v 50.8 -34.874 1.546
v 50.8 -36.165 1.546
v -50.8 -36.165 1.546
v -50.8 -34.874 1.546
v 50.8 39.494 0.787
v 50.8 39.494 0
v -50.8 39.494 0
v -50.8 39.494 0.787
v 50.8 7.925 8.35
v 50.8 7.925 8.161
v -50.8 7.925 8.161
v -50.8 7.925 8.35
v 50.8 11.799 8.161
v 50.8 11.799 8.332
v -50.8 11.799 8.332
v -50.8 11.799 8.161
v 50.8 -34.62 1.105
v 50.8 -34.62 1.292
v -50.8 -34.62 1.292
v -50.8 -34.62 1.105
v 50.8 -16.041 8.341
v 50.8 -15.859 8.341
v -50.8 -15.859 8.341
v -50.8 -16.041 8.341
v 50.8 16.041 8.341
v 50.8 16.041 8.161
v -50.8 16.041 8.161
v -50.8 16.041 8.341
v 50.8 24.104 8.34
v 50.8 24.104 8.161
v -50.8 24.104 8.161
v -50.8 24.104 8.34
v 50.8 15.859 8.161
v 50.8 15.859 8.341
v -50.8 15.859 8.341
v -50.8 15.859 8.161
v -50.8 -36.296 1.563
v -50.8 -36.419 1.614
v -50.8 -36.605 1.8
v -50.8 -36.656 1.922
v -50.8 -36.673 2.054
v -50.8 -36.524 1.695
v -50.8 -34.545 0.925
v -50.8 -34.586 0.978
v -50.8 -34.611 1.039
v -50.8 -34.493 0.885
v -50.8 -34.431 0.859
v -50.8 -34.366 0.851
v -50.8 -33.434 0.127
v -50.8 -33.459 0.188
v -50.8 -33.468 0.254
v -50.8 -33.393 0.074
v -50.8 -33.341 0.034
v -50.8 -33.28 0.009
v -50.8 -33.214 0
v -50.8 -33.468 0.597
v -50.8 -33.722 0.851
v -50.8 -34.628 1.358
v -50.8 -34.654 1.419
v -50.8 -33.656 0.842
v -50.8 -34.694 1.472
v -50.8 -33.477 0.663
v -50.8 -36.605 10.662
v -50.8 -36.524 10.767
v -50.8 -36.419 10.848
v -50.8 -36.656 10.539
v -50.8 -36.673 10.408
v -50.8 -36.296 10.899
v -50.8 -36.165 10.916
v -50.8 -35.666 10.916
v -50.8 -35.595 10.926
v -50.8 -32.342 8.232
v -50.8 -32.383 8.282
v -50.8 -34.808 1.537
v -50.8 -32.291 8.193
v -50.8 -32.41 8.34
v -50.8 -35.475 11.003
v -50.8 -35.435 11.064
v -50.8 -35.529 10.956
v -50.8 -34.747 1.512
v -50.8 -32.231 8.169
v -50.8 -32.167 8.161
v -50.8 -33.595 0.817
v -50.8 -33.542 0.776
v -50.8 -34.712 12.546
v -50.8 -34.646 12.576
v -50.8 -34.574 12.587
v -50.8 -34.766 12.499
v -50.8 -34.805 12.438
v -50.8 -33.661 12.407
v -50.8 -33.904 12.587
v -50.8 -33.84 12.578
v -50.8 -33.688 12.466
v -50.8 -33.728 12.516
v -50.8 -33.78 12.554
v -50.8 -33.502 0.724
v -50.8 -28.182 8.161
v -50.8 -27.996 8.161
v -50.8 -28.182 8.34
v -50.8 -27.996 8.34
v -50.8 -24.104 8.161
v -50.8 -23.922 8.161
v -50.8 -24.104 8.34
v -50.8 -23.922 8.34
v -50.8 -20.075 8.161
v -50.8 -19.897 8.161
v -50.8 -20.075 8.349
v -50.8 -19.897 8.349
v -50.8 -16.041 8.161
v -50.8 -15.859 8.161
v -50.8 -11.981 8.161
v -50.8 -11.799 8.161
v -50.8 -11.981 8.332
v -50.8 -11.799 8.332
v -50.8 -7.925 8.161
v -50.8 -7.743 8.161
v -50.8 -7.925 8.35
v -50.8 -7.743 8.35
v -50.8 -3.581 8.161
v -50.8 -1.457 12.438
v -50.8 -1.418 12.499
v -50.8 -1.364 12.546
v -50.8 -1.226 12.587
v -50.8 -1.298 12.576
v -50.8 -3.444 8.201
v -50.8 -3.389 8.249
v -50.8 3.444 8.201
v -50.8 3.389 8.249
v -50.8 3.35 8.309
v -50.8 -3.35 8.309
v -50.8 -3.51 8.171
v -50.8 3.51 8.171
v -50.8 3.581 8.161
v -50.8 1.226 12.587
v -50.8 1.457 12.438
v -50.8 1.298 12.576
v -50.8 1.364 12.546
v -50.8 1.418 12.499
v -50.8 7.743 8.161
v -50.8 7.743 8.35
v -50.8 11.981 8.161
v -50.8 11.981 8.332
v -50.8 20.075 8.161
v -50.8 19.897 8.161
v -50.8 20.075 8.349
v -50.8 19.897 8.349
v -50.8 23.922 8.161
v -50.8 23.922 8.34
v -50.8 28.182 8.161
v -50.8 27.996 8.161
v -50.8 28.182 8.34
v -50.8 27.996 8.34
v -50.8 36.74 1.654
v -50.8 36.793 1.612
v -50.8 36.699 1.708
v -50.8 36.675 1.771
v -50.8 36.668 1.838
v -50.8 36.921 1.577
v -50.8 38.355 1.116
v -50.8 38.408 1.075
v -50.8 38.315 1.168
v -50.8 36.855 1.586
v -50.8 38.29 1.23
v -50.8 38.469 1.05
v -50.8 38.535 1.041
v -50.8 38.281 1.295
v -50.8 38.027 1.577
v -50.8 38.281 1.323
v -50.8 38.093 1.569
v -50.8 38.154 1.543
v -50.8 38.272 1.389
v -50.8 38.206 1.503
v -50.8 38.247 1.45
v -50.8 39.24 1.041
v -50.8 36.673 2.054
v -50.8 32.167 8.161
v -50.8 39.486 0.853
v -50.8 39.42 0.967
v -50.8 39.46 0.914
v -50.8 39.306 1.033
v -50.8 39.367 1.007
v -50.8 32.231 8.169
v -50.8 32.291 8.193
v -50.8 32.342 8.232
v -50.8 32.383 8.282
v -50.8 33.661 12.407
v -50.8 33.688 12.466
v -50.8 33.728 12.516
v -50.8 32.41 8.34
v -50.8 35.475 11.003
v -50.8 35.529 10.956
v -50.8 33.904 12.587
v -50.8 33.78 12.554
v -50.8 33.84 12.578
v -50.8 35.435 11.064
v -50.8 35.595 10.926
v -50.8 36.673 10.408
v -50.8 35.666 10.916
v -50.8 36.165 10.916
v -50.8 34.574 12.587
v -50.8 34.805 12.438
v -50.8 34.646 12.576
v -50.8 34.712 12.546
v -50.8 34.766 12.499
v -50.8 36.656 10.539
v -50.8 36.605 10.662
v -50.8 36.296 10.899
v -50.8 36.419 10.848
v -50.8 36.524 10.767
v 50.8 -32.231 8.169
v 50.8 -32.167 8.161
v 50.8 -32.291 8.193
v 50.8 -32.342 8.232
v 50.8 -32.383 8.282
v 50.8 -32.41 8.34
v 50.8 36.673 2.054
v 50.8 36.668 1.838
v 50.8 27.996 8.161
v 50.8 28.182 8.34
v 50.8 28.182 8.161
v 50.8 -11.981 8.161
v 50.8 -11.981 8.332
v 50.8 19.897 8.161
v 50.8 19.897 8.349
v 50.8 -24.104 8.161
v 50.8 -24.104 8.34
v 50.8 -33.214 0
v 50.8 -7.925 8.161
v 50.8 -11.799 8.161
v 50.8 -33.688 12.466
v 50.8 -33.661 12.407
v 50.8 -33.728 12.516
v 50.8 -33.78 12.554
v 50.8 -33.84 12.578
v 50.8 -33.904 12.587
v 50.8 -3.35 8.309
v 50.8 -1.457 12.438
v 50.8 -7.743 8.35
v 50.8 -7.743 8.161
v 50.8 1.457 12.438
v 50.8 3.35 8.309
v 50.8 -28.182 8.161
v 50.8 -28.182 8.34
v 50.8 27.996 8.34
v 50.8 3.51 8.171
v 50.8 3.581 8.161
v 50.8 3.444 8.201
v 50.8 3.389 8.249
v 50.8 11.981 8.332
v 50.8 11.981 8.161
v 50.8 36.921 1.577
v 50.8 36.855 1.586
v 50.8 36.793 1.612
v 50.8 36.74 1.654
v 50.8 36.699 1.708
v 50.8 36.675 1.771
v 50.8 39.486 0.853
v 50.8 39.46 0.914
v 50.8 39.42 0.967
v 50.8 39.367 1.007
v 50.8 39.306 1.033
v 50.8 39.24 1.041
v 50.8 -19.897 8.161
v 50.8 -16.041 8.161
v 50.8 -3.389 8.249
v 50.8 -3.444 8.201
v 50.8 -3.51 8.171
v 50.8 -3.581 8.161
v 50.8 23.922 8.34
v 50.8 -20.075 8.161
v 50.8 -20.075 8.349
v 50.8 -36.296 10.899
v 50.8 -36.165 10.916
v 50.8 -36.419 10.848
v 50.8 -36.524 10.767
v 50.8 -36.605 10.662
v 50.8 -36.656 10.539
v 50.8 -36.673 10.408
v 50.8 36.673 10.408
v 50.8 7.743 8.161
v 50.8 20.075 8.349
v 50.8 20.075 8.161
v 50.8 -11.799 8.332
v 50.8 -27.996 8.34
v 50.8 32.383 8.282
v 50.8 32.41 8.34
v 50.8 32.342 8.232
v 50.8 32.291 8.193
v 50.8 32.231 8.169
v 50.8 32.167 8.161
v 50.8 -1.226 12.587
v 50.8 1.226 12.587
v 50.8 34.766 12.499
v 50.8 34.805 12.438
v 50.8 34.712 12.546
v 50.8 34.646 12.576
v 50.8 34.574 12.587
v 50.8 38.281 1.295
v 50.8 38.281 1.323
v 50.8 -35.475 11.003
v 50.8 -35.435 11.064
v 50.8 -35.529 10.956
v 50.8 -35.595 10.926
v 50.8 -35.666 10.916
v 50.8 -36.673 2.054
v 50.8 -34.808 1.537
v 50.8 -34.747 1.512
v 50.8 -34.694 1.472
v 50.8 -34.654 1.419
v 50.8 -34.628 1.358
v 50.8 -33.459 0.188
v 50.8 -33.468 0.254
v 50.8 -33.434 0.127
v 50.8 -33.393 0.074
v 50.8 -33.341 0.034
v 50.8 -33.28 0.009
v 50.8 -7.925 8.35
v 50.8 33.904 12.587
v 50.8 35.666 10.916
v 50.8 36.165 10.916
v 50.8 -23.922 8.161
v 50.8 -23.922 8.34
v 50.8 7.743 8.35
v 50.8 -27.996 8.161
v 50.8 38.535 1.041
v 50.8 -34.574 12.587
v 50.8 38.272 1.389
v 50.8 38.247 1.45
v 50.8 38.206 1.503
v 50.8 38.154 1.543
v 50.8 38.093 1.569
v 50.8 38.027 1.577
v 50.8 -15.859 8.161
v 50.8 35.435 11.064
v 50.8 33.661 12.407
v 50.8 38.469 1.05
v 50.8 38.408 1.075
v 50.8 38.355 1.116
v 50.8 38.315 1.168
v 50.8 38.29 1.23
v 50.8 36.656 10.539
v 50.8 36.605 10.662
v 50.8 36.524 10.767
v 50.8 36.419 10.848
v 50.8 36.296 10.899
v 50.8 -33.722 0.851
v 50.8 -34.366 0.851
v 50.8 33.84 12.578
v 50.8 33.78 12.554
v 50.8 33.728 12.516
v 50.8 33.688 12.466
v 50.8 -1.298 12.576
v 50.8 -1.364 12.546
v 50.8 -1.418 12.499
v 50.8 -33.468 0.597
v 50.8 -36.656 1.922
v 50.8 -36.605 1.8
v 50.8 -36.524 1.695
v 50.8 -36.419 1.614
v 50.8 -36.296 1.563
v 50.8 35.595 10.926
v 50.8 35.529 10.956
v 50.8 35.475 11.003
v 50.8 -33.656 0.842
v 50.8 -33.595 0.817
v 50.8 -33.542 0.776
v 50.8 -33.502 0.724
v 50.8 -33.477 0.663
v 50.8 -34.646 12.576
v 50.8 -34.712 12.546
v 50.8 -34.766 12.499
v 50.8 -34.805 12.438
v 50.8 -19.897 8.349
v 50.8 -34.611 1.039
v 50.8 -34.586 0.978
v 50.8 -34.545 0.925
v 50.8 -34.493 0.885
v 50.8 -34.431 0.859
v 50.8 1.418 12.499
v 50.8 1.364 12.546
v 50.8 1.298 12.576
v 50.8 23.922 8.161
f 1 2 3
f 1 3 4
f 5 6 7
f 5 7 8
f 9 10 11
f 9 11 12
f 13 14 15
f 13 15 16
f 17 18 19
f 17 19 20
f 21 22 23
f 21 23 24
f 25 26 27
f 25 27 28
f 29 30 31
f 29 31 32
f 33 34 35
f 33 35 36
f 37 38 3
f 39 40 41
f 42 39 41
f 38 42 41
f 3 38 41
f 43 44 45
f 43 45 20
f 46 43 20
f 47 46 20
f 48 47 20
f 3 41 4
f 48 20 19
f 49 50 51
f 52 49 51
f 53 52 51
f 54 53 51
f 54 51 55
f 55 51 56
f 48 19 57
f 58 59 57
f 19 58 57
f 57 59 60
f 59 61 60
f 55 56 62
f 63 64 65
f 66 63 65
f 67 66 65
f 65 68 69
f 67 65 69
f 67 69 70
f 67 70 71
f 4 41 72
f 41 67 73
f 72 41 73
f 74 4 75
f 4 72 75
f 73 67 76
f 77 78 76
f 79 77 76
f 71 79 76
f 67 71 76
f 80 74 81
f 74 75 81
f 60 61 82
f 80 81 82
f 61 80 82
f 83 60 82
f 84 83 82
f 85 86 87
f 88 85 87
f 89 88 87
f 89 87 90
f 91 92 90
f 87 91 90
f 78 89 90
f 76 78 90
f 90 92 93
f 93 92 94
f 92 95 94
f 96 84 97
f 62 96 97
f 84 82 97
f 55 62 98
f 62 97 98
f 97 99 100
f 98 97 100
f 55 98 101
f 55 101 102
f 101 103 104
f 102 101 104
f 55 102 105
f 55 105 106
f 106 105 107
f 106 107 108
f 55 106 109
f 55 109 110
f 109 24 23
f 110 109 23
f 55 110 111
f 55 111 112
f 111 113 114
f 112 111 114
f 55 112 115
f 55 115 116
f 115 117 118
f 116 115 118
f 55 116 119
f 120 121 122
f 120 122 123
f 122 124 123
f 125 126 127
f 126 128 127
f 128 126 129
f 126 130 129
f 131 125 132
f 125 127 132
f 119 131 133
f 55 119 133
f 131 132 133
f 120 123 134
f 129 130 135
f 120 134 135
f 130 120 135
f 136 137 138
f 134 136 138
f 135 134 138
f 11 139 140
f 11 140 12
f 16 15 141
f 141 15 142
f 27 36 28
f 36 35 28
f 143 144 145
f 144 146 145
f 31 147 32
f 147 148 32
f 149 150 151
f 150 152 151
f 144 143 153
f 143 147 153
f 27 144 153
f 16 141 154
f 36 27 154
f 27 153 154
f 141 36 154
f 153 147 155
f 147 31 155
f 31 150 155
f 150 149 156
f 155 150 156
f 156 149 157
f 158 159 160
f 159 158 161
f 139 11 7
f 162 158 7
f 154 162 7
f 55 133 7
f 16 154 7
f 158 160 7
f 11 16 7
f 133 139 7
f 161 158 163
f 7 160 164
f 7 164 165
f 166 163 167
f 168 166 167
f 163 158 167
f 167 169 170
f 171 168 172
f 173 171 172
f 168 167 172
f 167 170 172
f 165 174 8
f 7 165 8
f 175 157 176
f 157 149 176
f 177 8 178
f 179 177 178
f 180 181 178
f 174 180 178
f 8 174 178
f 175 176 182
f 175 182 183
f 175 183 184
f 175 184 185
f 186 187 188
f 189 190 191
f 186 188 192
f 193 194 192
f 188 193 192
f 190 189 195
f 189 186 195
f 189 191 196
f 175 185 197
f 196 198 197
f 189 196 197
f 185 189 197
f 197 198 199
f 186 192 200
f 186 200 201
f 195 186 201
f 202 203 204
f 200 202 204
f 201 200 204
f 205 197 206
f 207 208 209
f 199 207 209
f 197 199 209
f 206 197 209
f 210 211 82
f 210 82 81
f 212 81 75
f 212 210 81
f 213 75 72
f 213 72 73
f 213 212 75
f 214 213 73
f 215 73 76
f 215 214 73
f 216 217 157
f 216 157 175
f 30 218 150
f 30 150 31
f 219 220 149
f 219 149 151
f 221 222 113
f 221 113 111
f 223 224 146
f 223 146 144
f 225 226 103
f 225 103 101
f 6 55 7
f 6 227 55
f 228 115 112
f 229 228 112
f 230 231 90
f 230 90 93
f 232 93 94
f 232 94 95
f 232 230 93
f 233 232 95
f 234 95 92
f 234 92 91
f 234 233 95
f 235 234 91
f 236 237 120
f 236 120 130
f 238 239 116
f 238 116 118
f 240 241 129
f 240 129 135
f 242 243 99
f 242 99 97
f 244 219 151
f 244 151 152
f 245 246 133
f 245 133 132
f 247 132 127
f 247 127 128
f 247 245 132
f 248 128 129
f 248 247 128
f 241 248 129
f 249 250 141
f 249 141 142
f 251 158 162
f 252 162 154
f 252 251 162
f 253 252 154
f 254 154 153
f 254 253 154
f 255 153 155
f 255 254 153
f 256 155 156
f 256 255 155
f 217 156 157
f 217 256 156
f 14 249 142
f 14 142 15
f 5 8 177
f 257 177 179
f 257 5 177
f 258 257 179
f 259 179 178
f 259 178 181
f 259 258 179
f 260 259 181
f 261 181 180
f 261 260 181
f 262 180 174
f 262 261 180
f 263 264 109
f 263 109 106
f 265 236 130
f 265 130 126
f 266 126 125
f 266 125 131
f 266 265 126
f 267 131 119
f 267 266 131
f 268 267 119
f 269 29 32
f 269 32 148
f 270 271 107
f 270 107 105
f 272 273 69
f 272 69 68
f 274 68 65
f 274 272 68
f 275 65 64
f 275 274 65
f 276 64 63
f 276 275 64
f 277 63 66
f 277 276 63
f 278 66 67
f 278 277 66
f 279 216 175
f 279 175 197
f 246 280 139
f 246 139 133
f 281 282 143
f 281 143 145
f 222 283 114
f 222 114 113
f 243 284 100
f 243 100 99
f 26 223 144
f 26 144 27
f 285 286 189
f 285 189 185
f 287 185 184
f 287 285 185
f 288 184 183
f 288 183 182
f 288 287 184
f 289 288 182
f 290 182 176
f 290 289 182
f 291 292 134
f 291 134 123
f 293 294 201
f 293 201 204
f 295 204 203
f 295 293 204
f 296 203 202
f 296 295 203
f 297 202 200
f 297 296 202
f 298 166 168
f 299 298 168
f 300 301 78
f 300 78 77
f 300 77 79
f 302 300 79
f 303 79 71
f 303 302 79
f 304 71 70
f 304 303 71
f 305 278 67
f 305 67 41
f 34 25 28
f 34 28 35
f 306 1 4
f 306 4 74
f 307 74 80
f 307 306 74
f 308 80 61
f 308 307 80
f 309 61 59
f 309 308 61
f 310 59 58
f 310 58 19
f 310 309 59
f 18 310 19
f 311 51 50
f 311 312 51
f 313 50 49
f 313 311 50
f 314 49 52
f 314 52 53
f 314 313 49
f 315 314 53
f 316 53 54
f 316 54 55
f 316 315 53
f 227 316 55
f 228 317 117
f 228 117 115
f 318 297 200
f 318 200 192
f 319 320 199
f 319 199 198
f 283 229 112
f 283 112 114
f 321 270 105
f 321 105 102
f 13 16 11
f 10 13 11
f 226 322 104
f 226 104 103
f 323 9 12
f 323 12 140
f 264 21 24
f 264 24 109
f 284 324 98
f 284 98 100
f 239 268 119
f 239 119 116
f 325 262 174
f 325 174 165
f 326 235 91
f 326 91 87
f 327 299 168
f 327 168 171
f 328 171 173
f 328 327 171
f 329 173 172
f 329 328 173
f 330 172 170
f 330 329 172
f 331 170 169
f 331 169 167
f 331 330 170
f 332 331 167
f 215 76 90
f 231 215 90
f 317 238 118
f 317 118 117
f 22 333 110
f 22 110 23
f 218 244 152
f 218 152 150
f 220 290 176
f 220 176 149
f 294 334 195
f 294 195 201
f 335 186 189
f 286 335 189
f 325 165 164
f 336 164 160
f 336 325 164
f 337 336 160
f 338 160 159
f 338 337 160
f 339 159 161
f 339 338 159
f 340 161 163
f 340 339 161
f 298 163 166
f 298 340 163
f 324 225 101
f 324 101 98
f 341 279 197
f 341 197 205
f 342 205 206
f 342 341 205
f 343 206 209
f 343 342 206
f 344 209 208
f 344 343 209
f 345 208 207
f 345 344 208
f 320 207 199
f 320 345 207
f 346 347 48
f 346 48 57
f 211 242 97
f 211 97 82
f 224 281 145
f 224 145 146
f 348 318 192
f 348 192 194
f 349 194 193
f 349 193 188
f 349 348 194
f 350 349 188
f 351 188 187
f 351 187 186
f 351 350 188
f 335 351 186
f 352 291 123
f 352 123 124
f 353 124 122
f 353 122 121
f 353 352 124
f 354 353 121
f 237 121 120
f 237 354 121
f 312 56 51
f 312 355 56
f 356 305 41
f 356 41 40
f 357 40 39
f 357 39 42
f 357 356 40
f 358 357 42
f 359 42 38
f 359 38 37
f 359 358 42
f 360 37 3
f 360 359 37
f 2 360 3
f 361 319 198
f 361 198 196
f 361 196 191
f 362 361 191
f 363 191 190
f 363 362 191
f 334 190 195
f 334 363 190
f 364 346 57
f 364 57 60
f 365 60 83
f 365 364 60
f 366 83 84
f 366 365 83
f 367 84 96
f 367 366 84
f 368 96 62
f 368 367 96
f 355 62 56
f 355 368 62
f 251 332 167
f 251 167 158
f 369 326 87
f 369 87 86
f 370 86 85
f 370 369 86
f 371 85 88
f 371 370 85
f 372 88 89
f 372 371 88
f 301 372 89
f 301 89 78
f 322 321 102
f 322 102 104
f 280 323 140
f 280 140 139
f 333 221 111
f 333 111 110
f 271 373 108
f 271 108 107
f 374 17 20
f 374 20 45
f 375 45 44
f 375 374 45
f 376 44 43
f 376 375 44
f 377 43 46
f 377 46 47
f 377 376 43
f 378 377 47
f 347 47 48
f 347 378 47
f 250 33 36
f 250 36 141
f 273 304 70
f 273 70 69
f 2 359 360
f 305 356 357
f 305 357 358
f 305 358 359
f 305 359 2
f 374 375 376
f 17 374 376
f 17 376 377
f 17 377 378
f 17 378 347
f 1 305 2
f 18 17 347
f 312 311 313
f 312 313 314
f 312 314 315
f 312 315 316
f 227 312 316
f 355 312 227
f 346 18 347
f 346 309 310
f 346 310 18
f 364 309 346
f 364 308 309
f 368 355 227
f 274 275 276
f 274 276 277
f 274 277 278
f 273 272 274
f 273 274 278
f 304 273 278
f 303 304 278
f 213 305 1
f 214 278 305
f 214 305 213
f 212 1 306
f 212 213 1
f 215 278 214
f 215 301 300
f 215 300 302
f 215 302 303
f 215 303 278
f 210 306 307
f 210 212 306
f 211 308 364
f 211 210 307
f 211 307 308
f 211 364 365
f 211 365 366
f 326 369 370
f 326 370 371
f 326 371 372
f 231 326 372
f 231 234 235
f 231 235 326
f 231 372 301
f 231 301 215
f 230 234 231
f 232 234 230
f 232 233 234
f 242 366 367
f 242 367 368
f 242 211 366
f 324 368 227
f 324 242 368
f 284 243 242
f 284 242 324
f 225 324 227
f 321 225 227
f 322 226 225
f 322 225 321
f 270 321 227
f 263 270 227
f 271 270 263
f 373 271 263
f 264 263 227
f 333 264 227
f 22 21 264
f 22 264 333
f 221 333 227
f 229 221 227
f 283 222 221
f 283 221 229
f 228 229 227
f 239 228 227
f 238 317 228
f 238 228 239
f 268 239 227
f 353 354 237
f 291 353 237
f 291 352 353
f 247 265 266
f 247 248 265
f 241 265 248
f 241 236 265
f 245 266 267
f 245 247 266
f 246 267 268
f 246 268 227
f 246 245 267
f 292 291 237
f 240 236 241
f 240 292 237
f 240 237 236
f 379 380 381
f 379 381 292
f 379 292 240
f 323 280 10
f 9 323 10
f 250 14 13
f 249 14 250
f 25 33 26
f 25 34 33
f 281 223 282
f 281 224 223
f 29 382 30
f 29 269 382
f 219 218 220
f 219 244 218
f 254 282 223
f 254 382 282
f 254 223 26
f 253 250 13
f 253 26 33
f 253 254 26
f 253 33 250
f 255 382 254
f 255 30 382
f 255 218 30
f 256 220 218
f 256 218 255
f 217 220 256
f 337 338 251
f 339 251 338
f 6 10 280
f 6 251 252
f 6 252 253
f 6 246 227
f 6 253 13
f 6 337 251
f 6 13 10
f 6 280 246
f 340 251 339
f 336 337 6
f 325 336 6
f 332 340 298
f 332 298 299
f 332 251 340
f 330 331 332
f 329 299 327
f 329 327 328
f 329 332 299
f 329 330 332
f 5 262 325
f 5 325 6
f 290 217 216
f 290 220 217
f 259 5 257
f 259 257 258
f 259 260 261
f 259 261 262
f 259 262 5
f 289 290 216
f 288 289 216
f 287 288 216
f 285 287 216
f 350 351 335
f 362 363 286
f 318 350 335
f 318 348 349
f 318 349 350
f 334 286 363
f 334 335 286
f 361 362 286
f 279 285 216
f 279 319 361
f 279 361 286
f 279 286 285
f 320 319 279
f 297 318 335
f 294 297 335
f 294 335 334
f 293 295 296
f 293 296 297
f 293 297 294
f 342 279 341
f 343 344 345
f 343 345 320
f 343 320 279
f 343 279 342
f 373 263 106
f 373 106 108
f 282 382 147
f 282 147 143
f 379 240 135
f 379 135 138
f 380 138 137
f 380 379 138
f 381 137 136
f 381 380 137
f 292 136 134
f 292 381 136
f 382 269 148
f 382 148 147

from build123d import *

# Parameters (mm, degrees)
F1_DEPTH      = 50.8
F1_DEPTH_BACK = 50.8


with BuildPart() as f1:
    # F0 (on Right) → F1 (new body, two sides)
    with BuildSketch(Plane.YZ) as f1_sk:
        with BuildLine():
            Line((-33.213852, 0), (0, 0))
            Line((0, 0), (39.494485, 0))
            Line((39.494485, 0), (39.494485, 0.787258))
            ThreePointArc((39.494485, 0.787258), (39.42009, 0.966864), (39.240485, 1.041258))
            Line((39.240485, 1.041258), (38.534891, 1.041258))
            ThreePointArc((38.534891, 1.041258), (38.355286, 1.115653), (38.280891, 1.295258))
            Line((38.280891, 1.295258), (38.280891, 1.323207))
            ThreePointArc((38.280891, 1.323207), (38.206496, 1.502813), (38.026891, 1.577207))
            Line((38.026891, 1.577207), (36.921442, 1.577207))
            ThreePointArc((36.921442, 1.577207), (36.739611, 1.653856), (36.667521, 1.837542))
            Line((36.667521, 1.837542), (36.67292, 2.053964))
            Line((36.67292, 2.053964), (36.67292, 10.407829))
            ThreePointArc((36.67292, 10.407829), (36.52413, 10.767039), (36.16492, 10.915829))
            Line((36.16492, 10.915829), (35.66636, 10.915829))
            ThreePointArc((35.66636, 10.915829), (35.529192, 10.956051), (35.435466, 11.063979))
            Line((35.435466, 11.063979), (34.805344, 12.438487))
            ThreePointArc((34.805344, 12.438487), (34.711619, 12.546415), (34.57445, 12.586637))
            Line((34.57445, 12.586637), (33.903744, 12.586637))
            ThreePointArc((33.903744, 12.586637), (33.752842, 12.536952), (33.660976, 12.407335))
            Line((33.660976, 12.407335), (32.40961, 8.340397))
            ThreePointArc((32.40961, 8.340397), (32.317744, 8.21078), (32.166843, 8.161095))
            Line((32.166843, 8.161095), (28.181681, 8.161095))
            Line((28.181681, 8.161095), (28.181681, 8.340397))
            Line((28.181681, 8.340397), (27.995555, 8.340397))
            Line((27.995555, 8.340397), (27.995555, 8.161095))
            Line((27.995555, 8.161095), (24.103897, 8.161095))
            Line((24.103897, 8.161095), (24.103897, 8.339632))
            Line((24.103897, 8.339632), (23.922047, 8.339632))
            Line((23.922047, 8.339632), (23.922047, 8.161095))
            Line((23.922047, 8.161095), (20.075496, 8.161095))
            Line((20.075496, 8.161095), (20.075496, 8.348511))
            Line((20.075496, 8.348511), (19.897439, 8.348511))
            Line((19.897439, 8.348511), (19.897439, 8.161095))
            Line((19.897439, 8.161095), (16.041223, 8.161095))
            Line((16.041223, 8.161095), (16.041223, 8.341497))
            Line((16.041223, 8.341497), (15.859049, 8.341497))
            Line((15.859049, 8.341497), (15.859049, 8.161095))
            Line((15.859049, 8.161095), (11.9808, 8.161095))
            Line((11.9808, 8.161095), (11.9808, 8.331576))
            Line((11.9808, 8.331576), (11.798942, 8.331576))
            Line((11.798942, 8.331576), (11.798942, 8.161095))
            Line((11.798942, 8.161095), (7.925448, 8.161095))
            Line((7.925448, 8.161095), (7.925448, 8.35035))
            Line((7.925448, 8.35035), (7.742784, 8.35035))
            Line((7.742784, 8.35035), (7.742784, 8.161095))
            Line((7.742784, 8.161095), (3.581181, 8.161095))
            ThreePointArc((3.581181, 8.161095), (3.444013, 8.201317), (3.350287, 8.309245))
            Line((3.350287, 8.309245), (1.457299, 12.438487))
            ThreePointArc((1.457299, 12.438487), (1.363573, 12.546415), (1.226405, 12.586637))
            Line((1.226405, 12.586637), (0, 12.586637))
            Line((0, 12.586637), (-1.226405, 12.586637))
            ThreePointArc((-1.226405, 12.586637), (-1.363573, 12.546415), (-1.457299, 12.438487))
            Line((-1.457299, 12.438487), (-3.350287, 8.309245))
            ThreePointArc((-3.350287, 8.309245), (-3.444013, 8.201317), (-3.581181, 8.161095))
            Line((-3.581181, 8.161095), (-7.742784, 8.161095))
            Line((-7.742784, 8.161095), (-7.742784, 8.35035))
            Line((-7.742784, 8.35035), (-7.925448, 8.35035))
            Line((-7.925448, 8.35035), (-7.925448, 8.161095))
            Line((-7.925448, 8.161095), (-11.798942, 8.161095))
            Line((-11.798942, 8.161095), (-11.798942, 8.331576))
            Line((-11.798942, 8.331576), (-11.9808, 8.331576))
            Line((-11.9808, 8.331576), (-11.9808, 8.161095))
            Line((-11.9808, 8.161095), (-15.859049, 8.161095))
            Line((-15.859049, 8.161095), (-15.859049, 8.341497))
            Line((-15.859049, 8.341497), (-16.041223, 8.341497))
            Line((-16.041223, 8.341497), (-16.041223, 8.161095))
            Line((-16.041223, 8.161095), (-19.897439, 8.161095))
            Line((-19.897439, 8.161095), (-19.897439, 8.348511))
            Line((-19.897439, 8.348511), (-20.075496, 8.348511))
            Line((-20.075496, 8.348511), (-20.075496, 8.161095))
            Line((-20.075496, 8.161095), (-23.922047, 8.161095))
            Line((-23.922047, 8.161095), (-23.922047, 8.339632))
            Line((-23.922047, 8.339632), (-24.103897, 8.339632))
            Line((-24.103897, 8.339632), (-24.103897, 8.161095))
            Line((-24.103897, 8.161095), (-27.995555, 8.161095))
            Line((-27.995555, 8.161095), (-27.995555, 8.340397))
            Line((-27.995555, 8.340397), (-28.181681, 8.340397))
            Line((-28.181681, 8.340397), (-28.181681, 8.161095))
            Line((-28.181681, 8.161095), (-32.166843, 8.161095))
            ThreePointArc((-32.166843, 8.161095), (-32.317744, 8.21078), (-32.40961, 8.340397))
            Line((-32.40961, 8.340397), (-33.660976, 12.407335))
            ThreePointArc((-33.660976, 12.407335), (-33.752842, 12.536952), (-33.903744, 12.586637))
            Line((-33.903744, 12.586637), (-34.57445, 12.586637))
            ThreePointArc((-34.57445, 12.586637), (-34.711619, 12.546415), (-34.805344, 12.438487))
            Line((-34.805344, 12.438487), (-35.435466, 11.063979))
            ThreePointArc((-35.435466, 11.063979), (-35.529192, 10.956051), (-35.66636, 10.915829))
            Line((-35.66636, 10.915829), (-36.16492, 10.915829))
            ThreePointArc((-36.16492, 10.915829), (-36.52413, 10.767039), (-36.67292, 10.407829))
            Line((-36.67292, 10.407829), (-36.67292, 2.053964))
            ThreePointArc((-36.67292, 2.053964), (-36.52413, 1.694754), (-36.16492, 1.545964))
            Line((-36.16492, 1.545964), (-34.873612, 1.545964))
            ThreePointArc((-34.873612, 1.545964), (-34.694007, 1.47157), (-34.619612, 1.291964))
            Line((-34.619612, 1.291964), (-34.619612, 1.104801))
            ThreePointArc((-34.619612, 1.104801), (-34.545217, 0.925196), (-34.365612, 0.850801))
            Line((-34.365612, 0.850801), (-33.721852, 0.850801))
            ThreePointArc((-33.721852, 0.850801), (-33.542246, 0.776406), (-33.467852, 0.596801))
            Line((-33.467852, 0.596801), (-33.467852, 0.254))
            ThreePointArc((-33.467852, 0.254), (-33.393457, 0.074395), (-33.213852, 0))
        make_face()
    extrude(amount=F1_DEPTH)
    extrude(f1_sk.sketch, amount=-F1_DEPTH_BACK)


solid = f1.part
